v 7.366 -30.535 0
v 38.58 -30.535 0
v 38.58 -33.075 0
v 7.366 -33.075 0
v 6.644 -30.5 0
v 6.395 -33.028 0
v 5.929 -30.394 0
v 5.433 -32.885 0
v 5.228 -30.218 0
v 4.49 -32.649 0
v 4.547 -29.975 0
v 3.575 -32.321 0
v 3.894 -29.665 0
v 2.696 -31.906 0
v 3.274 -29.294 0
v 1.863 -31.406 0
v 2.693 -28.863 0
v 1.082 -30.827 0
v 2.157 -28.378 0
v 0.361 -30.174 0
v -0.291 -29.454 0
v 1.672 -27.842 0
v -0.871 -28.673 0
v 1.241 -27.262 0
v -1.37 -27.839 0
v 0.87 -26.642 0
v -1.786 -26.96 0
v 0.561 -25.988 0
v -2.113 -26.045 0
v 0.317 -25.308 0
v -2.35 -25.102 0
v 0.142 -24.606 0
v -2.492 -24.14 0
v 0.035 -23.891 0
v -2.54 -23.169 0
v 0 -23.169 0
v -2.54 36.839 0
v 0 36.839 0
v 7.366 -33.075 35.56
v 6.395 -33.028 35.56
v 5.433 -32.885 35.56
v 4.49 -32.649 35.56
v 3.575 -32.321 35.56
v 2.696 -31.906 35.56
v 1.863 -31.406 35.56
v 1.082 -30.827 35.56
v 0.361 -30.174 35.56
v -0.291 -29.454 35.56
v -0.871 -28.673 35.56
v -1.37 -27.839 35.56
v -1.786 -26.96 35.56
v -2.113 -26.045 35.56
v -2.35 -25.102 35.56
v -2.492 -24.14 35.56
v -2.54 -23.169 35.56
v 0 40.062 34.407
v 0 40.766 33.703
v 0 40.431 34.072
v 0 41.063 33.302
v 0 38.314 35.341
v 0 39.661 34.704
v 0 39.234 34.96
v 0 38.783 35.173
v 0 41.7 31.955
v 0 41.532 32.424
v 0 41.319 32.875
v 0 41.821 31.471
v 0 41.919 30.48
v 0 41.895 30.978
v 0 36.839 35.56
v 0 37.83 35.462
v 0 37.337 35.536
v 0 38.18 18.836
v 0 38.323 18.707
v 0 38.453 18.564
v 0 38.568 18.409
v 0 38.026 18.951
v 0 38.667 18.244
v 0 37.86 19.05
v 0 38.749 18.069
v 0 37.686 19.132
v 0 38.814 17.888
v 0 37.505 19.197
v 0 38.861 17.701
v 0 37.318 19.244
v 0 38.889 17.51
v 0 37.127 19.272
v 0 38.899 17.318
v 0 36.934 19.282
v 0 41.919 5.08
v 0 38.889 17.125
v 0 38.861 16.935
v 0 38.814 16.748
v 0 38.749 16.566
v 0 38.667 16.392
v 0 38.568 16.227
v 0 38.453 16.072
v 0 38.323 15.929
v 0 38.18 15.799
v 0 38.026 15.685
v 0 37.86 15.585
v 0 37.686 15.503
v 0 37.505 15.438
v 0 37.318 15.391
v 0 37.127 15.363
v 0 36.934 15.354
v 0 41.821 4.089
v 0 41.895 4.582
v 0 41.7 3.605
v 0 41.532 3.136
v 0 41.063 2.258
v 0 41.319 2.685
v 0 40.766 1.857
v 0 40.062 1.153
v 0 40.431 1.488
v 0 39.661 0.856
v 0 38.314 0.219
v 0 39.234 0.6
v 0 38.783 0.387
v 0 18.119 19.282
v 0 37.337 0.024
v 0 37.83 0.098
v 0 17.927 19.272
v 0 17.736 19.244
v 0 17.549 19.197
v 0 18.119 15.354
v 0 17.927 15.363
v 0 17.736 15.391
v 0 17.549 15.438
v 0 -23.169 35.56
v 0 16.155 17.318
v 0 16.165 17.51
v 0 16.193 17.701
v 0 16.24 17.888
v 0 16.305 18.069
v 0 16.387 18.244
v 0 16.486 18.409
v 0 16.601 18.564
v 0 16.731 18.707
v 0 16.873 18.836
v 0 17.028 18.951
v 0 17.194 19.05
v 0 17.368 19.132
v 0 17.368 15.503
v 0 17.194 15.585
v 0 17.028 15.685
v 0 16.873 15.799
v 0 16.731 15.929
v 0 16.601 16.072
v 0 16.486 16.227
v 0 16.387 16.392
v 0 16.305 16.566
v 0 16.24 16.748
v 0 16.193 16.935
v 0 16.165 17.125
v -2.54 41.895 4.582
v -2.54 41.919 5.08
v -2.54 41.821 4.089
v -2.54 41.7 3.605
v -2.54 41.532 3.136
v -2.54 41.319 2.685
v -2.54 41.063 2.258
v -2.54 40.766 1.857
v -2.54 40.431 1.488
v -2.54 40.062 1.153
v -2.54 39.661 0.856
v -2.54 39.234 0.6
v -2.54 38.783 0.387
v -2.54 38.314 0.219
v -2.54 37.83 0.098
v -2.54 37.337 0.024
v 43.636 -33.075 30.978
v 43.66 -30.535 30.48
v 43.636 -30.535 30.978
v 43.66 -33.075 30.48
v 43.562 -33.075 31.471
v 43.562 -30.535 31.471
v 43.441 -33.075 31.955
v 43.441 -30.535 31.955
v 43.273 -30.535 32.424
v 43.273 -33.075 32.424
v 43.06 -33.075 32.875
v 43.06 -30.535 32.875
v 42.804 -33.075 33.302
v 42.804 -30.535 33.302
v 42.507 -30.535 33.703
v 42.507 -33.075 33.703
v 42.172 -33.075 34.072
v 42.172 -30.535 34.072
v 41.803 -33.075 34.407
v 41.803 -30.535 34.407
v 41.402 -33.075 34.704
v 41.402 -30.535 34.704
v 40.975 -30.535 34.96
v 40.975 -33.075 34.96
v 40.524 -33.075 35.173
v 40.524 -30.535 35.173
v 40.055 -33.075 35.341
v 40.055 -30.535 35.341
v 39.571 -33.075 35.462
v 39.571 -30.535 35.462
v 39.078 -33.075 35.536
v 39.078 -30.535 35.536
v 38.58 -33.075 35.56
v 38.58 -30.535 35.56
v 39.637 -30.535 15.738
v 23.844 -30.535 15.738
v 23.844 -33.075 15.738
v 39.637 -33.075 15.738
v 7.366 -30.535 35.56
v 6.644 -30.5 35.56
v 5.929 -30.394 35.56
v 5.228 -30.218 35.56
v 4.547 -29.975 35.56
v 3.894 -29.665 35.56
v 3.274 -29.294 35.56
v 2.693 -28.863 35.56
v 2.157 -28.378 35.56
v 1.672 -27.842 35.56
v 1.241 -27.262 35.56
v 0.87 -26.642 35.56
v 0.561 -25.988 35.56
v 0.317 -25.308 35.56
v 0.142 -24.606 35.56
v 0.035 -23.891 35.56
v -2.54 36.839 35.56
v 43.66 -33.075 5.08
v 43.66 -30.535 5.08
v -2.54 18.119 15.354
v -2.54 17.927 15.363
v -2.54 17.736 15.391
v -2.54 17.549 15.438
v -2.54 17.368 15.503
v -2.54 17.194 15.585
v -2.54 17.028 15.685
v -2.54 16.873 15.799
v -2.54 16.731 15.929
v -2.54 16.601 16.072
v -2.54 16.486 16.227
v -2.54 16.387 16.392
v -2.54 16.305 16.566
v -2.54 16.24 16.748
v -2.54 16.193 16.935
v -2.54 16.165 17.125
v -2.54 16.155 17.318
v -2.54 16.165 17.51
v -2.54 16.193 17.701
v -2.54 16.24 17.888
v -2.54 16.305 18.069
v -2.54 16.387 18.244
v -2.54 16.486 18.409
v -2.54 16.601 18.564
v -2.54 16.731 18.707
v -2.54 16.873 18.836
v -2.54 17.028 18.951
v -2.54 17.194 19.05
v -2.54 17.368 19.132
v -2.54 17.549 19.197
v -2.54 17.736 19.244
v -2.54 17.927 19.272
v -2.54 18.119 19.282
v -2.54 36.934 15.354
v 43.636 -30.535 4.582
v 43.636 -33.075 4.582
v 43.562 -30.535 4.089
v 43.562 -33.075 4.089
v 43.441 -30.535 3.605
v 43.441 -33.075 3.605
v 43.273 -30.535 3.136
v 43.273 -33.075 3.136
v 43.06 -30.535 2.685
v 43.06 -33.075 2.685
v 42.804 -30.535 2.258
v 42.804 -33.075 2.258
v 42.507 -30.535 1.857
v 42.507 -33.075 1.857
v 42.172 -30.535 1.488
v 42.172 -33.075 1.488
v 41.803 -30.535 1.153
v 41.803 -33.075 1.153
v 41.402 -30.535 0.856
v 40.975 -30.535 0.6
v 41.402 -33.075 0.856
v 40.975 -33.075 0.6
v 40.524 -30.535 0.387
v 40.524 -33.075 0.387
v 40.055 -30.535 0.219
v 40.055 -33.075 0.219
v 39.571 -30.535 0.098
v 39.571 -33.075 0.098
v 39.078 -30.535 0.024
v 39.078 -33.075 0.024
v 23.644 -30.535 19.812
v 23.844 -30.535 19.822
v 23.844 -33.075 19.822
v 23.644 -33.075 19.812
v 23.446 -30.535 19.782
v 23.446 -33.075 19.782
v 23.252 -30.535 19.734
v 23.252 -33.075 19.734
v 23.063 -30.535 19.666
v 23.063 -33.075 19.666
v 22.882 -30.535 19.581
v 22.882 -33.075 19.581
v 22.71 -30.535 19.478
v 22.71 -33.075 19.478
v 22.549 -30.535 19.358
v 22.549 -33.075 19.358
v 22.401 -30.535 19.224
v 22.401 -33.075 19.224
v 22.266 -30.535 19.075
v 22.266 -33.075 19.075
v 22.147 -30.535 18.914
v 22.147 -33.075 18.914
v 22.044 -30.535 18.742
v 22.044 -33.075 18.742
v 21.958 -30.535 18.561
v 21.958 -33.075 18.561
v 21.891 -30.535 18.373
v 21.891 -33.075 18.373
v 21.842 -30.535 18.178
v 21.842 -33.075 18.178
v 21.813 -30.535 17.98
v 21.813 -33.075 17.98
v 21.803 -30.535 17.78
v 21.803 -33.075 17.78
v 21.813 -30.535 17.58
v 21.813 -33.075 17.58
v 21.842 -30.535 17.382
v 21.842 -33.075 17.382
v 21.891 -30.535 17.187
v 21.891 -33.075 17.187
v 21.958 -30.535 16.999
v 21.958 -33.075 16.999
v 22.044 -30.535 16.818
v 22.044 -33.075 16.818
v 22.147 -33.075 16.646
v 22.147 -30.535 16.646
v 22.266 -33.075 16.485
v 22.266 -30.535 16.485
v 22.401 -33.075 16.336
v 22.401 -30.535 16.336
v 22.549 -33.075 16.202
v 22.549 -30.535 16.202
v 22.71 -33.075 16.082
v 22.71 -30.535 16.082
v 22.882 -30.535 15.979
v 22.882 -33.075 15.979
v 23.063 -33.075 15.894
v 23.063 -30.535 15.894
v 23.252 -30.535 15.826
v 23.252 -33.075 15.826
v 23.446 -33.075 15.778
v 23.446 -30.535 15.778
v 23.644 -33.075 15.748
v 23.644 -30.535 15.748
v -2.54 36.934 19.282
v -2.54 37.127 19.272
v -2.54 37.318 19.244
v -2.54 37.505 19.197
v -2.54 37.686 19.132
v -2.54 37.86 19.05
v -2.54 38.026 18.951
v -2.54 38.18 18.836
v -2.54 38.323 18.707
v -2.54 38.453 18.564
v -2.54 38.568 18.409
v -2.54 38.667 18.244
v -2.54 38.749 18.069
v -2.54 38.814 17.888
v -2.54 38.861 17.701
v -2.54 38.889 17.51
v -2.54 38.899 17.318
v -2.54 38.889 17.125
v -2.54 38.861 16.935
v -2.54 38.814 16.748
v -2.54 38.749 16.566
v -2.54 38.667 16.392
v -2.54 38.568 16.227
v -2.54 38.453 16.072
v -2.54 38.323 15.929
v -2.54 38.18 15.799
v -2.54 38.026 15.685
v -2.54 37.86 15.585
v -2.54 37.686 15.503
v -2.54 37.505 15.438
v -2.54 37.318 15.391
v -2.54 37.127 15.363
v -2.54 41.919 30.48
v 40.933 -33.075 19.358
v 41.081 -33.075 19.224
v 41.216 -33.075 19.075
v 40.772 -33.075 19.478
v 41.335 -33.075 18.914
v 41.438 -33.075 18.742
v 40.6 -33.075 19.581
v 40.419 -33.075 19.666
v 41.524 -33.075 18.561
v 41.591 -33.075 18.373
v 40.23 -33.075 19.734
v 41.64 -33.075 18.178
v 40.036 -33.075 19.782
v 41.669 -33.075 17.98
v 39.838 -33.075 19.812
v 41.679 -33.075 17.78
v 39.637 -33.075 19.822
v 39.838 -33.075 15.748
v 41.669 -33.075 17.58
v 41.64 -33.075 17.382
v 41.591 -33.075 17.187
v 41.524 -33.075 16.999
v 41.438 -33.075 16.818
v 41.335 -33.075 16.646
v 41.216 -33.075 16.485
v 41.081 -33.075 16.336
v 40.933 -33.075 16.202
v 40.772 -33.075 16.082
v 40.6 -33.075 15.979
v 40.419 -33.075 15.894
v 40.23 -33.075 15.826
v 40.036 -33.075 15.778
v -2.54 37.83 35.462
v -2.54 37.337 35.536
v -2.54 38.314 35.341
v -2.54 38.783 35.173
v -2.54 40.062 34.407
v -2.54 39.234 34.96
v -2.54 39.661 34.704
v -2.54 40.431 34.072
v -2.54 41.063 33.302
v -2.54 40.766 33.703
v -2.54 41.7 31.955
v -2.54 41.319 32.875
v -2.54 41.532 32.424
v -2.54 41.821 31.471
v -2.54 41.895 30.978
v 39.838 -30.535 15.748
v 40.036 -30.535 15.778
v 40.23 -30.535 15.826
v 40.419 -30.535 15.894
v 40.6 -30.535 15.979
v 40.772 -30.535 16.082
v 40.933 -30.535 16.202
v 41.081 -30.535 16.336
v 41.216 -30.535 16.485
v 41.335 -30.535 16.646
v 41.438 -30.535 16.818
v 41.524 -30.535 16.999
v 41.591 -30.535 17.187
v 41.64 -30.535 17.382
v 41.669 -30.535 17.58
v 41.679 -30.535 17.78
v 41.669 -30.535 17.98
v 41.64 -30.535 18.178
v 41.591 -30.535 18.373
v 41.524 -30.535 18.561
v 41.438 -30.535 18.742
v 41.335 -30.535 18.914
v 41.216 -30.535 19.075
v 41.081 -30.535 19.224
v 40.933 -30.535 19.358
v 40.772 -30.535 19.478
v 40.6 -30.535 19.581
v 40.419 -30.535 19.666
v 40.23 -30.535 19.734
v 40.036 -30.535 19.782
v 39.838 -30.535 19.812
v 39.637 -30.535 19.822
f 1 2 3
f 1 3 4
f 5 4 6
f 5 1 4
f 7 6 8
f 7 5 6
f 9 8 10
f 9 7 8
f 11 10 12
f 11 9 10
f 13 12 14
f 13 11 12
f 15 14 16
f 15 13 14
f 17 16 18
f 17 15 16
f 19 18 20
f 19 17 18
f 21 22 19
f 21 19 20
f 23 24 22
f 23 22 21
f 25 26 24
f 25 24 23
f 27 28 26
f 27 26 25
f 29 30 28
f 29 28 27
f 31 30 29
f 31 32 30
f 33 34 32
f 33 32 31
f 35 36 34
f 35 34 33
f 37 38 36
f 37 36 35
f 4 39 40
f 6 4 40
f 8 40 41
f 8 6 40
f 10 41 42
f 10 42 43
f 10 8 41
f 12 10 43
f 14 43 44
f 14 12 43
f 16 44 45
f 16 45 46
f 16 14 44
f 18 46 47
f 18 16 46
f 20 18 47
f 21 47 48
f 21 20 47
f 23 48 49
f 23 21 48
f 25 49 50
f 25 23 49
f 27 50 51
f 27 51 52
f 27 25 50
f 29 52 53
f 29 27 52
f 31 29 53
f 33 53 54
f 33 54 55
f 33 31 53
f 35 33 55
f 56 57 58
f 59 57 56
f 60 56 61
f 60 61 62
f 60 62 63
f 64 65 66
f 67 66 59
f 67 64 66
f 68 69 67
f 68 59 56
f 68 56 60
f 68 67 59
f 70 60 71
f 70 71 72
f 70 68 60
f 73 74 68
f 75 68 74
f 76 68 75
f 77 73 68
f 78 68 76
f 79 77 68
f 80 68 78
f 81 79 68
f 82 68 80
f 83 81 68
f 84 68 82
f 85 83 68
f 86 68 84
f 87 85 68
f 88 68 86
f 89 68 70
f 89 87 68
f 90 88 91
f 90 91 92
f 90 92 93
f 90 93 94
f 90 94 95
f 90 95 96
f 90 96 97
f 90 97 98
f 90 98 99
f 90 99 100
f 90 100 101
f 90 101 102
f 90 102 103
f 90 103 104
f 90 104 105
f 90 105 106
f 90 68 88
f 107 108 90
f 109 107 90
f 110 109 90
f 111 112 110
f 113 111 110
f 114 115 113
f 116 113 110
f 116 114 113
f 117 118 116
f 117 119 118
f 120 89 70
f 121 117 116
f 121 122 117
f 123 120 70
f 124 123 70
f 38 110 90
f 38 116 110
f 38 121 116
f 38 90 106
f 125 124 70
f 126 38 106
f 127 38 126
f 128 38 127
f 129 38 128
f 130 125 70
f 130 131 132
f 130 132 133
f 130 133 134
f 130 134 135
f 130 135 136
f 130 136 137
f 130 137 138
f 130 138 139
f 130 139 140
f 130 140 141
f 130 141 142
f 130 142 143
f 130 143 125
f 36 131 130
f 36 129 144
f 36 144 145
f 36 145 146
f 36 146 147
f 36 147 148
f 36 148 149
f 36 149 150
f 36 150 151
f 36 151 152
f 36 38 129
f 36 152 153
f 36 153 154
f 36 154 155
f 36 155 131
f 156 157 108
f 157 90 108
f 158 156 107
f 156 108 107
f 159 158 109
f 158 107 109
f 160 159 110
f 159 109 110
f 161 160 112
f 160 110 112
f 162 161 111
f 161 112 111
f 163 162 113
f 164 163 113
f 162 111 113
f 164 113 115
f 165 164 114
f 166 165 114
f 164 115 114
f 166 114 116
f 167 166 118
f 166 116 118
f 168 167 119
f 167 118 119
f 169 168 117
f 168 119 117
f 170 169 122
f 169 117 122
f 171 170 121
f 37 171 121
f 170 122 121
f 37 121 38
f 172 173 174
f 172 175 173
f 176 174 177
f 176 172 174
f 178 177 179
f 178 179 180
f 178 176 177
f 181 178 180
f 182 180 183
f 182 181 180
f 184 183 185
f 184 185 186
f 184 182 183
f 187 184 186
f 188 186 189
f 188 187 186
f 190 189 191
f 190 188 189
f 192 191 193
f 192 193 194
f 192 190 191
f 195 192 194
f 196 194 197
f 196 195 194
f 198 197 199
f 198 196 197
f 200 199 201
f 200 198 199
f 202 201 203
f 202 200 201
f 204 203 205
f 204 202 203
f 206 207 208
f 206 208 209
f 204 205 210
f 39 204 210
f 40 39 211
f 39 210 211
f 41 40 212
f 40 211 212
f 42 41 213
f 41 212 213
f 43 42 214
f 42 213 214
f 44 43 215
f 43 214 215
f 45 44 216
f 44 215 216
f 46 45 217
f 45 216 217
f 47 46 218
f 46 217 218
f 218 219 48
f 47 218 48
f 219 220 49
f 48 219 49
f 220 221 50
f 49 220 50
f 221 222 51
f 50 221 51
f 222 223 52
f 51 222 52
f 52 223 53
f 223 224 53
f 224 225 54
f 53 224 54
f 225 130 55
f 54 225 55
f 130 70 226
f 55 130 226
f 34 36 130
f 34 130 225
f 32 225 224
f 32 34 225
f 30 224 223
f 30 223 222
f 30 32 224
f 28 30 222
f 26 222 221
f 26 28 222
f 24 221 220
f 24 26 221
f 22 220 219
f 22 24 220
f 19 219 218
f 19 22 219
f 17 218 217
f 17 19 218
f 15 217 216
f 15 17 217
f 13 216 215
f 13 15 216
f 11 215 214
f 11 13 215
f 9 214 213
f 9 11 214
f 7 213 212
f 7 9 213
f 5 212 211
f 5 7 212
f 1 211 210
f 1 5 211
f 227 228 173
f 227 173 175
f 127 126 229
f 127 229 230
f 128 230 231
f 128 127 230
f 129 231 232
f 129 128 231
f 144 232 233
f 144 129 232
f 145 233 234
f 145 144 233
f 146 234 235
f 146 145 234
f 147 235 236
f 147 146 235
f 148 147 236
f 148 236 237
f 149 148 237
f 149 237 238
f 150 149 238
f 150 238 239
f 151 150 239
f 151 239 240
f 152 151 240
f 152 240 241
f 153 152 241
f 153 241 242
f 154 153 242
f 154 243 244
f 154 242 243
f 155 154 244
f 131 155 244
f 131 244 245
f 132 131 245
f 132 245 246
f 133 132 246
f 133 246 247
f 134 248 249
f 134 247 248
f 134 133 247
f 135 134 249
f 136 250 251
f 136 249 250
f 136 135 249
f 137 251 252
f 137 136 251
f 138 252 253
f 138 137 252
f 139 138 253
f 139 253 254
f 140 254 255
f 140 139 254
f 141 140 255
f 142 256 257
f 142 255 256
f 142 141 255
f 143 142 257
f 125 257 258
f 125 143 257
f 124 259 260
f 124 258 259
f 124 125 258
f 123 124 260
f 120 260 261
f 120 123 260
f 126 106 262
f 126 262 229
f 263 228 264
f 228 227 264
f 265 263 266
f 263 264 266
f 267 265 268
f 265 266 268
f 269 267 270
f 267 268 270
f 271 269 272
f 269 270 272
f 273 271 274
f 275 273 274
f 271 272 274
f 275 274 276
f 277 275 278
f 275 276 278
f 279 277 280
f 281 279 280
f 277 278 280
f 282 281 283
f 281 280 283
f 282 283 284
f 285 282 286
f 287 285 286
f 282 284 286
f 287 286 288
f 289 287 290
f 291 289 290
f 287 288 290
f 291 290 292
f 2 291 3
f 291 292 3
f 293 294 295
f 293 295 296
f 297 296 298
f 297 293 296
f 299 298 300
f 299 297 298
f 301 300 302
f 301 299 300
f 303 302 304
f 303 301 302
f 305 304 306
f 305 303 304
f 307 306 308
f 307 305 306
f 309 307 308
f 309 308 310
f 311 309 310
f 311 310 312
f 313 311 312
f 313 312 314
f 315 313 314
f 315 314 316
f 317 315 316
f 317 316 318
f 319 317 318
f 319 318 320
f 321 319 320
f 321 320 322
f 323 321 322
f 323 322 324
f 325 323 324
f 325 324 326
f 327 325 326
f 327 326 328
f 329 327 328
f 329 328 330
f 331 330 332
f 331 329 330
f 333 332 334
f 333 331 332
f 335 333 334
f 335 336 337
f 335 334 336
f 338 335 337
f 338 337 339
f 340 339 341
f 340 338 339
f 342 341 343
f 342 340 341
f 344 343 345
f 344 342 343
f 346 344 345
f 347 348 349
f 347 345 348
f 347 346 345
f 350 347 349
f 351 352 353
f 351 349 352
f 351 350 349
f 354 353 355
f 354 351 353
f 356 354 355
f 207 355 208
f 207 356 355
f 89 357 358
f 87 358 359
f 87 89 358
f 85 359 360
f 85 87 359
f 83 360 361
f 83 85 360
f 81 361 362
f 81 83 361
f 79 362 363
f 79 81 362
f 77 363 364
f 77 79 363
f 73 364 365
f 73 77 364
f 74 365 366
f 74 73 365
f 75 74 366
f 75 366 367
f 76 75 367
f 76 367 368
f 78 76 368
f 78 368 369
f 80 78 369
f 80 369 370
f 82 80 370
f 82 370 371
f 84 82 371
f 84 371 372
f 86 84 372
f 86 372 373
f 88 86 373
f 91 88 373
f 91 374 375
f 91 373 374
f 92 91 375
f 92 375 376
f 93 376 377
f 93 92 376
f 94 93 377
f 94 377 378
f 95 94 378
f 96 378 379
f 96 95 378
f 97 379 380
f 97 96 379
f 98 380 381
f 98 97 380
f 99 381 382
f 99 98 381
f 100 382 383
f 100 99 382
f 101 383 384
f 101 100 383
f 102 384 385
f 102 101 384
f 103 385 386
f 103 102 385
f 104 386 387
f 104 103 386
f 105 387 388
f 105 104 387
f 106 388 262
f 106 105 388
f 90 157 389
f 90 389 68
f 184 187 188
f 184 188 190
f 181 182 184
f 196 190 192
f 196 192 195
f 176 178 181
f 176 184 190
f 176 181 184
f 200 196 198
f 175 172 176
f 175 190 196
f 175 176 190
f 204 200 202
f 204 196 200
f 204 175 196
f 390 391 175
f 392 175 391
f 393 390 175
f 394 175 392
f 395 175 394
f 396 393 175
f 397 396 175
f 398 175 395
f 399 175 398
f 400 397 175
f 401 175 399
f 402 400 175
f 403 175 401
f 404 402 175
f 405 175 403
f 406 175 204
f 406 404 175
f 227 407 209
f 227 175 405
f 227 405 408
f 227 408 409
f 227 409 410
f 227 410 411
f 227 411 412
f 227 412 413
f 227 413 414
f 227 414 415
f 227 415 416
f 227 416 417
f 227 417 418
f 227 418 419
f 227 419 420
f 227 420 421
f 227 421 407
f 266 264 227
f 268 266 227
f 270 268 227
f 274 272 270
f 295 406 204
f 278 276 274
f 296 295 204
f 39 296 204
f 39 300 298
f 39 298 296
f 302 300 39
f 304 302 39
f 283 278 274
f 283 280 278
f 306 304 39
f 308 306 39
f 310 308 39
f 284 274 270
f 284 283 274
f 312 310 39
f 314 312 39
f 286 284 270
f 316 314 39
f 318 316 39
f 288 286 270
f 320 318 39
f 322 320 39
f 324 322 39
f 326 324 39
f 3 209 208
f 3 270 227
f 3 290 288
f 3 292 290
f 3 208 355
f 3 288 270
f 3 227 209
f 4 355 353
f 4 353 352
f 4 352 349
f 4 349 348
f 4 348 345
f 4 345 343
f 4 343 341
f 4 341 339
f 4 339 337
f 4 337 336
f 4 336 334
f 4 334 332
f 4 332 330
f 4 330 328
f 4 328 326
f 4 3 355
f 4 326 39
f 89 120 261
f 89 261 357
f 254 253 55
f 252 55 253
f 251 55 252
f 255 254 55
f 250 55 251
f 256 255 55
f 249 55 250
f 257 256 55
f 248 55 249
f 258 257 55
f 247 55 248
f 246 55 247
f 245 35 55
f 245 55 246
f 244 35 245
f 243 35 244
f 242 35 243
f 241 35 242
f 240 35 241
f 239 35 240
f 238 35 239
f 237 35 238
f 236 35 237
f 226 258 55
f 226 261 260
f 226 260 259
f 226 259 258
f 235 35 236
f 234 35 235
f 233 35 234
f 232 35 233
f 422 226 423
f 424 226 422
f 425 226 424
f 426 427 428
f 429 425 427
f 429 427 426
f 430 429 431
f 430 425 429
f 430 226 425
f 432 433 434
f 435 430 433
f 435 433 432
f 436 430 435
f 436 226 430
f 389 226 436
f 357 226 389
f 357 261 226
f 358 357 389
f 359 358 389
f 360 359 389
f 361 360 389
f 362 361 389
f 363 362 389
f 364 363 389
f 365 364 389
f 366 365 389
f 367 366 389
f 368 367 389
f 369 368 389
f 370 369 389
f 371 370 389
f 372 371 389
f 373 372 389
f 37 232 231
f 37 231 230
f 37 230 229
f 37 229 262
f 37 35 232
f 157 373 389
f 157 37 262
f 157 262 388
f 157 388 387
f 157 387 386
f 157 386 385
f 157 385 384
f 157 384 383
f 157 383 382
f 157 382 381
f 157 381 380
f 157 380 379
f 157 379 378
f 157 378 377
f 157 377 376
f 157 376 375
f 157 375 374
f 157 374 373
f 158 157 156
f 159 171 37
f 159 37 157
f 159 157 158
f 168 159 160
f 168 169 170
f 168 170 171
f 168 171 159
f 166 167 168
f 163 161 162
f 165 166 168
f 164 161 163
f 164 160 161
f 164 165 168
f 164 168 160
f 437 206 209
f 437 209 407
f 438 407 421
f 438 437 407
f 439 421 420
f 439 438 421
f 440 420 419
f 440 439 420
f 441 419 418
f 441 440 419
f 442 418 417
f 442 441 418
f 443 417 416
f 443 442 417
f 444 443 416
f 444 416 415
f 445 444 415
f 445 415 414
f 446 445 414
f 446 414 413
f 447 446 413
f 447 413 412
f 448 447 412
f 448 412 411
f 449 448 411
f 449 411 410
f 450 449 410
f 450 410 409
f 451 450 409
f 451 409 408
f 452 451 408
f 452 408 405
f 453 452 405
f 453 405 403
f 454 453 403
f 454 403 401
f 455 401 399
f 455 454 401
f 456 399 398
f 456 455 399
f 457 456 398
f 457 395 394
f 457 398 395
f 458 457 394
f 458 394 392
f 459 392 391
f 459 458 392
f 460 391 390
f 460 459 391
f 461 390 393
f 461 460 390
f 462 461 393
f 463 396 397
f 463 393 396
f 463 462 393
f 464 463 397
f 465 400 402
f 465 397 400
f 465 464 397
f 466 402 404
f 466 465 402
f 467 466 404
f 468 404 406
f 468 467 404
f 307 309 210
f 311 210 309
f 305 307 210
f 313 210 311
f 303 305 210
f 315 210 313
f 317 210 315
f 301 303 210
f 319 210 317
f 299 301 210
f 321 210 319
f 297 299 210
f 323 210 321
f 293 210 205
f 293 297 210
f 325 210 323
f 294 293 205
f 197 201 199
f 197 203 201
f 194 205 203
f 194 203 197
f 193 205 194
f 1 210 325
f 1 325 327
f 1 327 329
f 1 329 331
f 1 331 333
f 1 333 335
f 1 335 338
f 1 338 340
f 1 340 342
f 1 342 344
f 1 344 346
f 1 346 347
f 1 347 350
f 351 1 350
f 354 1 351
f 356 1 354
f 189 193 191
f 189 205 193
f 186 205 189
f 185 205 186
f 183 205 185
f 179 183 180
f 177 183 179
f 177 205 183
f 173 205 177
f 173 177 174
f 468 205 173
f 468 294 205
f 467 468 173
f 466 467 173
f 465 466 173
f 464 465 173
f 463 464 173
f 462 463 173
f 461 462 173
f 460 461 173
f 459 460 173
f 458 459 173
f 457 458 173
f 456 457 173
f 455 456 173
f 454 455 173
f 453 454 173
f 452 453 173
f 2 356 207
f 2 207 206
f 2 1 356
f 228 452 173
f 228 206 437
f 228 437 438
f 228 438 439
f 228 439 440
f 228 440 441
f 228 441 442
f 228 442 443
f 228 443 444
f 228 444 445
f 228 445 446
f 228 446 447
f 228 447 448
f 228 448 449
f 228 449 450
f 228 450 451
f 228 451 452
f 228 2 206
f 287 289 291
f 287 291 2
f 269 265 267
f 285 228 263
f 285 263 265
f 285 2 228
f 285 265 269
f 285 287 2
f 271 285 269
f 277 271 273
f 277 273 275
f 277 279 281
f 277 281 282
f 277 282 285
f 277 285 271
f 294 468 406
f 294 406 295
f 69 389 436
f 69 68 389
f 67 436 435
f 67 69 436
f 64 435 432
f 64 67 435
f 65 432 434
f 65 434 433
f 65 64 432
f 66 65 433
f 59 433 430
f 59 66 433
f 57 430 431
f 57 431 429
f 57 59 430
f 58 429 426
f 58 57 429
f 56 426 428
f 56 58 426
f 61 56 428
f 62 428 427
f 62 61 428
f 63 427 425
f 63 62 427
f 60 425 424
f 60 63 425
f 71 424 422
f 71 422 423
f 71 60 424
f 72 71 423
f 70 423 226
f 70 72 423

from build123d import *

# Parameters (mm, degrees)
EXTRUDE_THIN1_DEPTH = 35.56
FILLET1_R           = 5.08
CUT_EXTRUDE1_DEPTH  = 71.199112173
CUT_EXTRUDE2_DEPTH  = 92.762357485


with BuildPart() as part:
    # Sketch1 → Extrude-Thin1 (new body)
    with BuildSketch(Plane.XY):
        with BuildLine():
            Line((0, 41.918998188), (0, -23.169286538))
            ThreePointArc((0, -23.169286538), (2.157439192, -28.377805495), (7.365958148, -30.535244686))
            Line((7.365958148, -30.535244686), (43.660042841, -30.535244686))
            Line((43.660042841, -30.535244686), (43.660042841, -33.075244686))
            Line((43.660042841, -33.075244686), (7.365958148, -33.075244686))
            ThreePointArc((7.365958148, -33.075244686), (0.361387967, -30.173856719), (-2.54, -23.169286538))
            Line((-2.54, -23.169286538), (-2.54, 41.918998188))
            Line((-2.54, 41.918998188), (0, 41.918998188))
        make_face()
    extrude(amount=EXTRUDE_THIN1_DEPTH)

    # Fillet1
    fillet1_edges = [part.edges().sort_by_distance(p)[0] for p in [
        (-1.27, 41.918998188, 35.56),
        (-1.27, 41.918998188, 0),
        (43.660042841, -31.805244686, 35.56),
        (43.660042841, -31.805244686, 0),
    ]]
    fillet(fillet1_edges, radius=FILLET1_R)

    # Sketch2 → Cut-Extrude1 (cut, through all)
    with BuildSketch(Plane(origin=(0, 0, 0), x_dir=(0, 0, -1), z_dir=(1, 0, 0))):
        with BuildLine():
            Line((-15.353557986, 36.934347618), (-15.353557986, 18.119499612))
            ThreePointArc((-15.353557986, 18.119499612), (-17.317745415, 16.155312183), (-19.281932844, 18.119499612))
            Line((-19.281932844, 18.119499612), (-19.281932844, 36.934347618))
            ThreePointArc((-19.281932844, 36.934347618), (-17.317745415, 38.898535047), (-15.353557986, 36.934347618))
        make_face()
    extrude(amount=-CUT_EXTRUDE1_DEPTH, mode=Mode.SUBTRACT)

    # Sketch3 → Cut-Extrude2 (cut, through all)
    with BuildSketch(Plane(origin=(0, -30.535244686, 0), x_dir=(1, 0, 0), z_dir=(0, 1, 0))):
        with BuildLine():
            Line((39.637430097, -19.821656487), (23.84441046, -19.821656487))
            ThreePointArc((23.84441046, -19.821656487), (21.802753973, -17.78), (23.84441046, -15.738343513))
            Line((23.84441046, -15.738343513), (39.637430097, -15.738343513))
            ThreePointArc((39.637430097, -15.738343513), (41.679086584, -17.78), (39.637430097, -19.821656487))
        make_face()
    extrude(amount=-CUT_EXTRUDE2_DEPTH, mode=Mode.SUBTRACT)


solid = part.part
